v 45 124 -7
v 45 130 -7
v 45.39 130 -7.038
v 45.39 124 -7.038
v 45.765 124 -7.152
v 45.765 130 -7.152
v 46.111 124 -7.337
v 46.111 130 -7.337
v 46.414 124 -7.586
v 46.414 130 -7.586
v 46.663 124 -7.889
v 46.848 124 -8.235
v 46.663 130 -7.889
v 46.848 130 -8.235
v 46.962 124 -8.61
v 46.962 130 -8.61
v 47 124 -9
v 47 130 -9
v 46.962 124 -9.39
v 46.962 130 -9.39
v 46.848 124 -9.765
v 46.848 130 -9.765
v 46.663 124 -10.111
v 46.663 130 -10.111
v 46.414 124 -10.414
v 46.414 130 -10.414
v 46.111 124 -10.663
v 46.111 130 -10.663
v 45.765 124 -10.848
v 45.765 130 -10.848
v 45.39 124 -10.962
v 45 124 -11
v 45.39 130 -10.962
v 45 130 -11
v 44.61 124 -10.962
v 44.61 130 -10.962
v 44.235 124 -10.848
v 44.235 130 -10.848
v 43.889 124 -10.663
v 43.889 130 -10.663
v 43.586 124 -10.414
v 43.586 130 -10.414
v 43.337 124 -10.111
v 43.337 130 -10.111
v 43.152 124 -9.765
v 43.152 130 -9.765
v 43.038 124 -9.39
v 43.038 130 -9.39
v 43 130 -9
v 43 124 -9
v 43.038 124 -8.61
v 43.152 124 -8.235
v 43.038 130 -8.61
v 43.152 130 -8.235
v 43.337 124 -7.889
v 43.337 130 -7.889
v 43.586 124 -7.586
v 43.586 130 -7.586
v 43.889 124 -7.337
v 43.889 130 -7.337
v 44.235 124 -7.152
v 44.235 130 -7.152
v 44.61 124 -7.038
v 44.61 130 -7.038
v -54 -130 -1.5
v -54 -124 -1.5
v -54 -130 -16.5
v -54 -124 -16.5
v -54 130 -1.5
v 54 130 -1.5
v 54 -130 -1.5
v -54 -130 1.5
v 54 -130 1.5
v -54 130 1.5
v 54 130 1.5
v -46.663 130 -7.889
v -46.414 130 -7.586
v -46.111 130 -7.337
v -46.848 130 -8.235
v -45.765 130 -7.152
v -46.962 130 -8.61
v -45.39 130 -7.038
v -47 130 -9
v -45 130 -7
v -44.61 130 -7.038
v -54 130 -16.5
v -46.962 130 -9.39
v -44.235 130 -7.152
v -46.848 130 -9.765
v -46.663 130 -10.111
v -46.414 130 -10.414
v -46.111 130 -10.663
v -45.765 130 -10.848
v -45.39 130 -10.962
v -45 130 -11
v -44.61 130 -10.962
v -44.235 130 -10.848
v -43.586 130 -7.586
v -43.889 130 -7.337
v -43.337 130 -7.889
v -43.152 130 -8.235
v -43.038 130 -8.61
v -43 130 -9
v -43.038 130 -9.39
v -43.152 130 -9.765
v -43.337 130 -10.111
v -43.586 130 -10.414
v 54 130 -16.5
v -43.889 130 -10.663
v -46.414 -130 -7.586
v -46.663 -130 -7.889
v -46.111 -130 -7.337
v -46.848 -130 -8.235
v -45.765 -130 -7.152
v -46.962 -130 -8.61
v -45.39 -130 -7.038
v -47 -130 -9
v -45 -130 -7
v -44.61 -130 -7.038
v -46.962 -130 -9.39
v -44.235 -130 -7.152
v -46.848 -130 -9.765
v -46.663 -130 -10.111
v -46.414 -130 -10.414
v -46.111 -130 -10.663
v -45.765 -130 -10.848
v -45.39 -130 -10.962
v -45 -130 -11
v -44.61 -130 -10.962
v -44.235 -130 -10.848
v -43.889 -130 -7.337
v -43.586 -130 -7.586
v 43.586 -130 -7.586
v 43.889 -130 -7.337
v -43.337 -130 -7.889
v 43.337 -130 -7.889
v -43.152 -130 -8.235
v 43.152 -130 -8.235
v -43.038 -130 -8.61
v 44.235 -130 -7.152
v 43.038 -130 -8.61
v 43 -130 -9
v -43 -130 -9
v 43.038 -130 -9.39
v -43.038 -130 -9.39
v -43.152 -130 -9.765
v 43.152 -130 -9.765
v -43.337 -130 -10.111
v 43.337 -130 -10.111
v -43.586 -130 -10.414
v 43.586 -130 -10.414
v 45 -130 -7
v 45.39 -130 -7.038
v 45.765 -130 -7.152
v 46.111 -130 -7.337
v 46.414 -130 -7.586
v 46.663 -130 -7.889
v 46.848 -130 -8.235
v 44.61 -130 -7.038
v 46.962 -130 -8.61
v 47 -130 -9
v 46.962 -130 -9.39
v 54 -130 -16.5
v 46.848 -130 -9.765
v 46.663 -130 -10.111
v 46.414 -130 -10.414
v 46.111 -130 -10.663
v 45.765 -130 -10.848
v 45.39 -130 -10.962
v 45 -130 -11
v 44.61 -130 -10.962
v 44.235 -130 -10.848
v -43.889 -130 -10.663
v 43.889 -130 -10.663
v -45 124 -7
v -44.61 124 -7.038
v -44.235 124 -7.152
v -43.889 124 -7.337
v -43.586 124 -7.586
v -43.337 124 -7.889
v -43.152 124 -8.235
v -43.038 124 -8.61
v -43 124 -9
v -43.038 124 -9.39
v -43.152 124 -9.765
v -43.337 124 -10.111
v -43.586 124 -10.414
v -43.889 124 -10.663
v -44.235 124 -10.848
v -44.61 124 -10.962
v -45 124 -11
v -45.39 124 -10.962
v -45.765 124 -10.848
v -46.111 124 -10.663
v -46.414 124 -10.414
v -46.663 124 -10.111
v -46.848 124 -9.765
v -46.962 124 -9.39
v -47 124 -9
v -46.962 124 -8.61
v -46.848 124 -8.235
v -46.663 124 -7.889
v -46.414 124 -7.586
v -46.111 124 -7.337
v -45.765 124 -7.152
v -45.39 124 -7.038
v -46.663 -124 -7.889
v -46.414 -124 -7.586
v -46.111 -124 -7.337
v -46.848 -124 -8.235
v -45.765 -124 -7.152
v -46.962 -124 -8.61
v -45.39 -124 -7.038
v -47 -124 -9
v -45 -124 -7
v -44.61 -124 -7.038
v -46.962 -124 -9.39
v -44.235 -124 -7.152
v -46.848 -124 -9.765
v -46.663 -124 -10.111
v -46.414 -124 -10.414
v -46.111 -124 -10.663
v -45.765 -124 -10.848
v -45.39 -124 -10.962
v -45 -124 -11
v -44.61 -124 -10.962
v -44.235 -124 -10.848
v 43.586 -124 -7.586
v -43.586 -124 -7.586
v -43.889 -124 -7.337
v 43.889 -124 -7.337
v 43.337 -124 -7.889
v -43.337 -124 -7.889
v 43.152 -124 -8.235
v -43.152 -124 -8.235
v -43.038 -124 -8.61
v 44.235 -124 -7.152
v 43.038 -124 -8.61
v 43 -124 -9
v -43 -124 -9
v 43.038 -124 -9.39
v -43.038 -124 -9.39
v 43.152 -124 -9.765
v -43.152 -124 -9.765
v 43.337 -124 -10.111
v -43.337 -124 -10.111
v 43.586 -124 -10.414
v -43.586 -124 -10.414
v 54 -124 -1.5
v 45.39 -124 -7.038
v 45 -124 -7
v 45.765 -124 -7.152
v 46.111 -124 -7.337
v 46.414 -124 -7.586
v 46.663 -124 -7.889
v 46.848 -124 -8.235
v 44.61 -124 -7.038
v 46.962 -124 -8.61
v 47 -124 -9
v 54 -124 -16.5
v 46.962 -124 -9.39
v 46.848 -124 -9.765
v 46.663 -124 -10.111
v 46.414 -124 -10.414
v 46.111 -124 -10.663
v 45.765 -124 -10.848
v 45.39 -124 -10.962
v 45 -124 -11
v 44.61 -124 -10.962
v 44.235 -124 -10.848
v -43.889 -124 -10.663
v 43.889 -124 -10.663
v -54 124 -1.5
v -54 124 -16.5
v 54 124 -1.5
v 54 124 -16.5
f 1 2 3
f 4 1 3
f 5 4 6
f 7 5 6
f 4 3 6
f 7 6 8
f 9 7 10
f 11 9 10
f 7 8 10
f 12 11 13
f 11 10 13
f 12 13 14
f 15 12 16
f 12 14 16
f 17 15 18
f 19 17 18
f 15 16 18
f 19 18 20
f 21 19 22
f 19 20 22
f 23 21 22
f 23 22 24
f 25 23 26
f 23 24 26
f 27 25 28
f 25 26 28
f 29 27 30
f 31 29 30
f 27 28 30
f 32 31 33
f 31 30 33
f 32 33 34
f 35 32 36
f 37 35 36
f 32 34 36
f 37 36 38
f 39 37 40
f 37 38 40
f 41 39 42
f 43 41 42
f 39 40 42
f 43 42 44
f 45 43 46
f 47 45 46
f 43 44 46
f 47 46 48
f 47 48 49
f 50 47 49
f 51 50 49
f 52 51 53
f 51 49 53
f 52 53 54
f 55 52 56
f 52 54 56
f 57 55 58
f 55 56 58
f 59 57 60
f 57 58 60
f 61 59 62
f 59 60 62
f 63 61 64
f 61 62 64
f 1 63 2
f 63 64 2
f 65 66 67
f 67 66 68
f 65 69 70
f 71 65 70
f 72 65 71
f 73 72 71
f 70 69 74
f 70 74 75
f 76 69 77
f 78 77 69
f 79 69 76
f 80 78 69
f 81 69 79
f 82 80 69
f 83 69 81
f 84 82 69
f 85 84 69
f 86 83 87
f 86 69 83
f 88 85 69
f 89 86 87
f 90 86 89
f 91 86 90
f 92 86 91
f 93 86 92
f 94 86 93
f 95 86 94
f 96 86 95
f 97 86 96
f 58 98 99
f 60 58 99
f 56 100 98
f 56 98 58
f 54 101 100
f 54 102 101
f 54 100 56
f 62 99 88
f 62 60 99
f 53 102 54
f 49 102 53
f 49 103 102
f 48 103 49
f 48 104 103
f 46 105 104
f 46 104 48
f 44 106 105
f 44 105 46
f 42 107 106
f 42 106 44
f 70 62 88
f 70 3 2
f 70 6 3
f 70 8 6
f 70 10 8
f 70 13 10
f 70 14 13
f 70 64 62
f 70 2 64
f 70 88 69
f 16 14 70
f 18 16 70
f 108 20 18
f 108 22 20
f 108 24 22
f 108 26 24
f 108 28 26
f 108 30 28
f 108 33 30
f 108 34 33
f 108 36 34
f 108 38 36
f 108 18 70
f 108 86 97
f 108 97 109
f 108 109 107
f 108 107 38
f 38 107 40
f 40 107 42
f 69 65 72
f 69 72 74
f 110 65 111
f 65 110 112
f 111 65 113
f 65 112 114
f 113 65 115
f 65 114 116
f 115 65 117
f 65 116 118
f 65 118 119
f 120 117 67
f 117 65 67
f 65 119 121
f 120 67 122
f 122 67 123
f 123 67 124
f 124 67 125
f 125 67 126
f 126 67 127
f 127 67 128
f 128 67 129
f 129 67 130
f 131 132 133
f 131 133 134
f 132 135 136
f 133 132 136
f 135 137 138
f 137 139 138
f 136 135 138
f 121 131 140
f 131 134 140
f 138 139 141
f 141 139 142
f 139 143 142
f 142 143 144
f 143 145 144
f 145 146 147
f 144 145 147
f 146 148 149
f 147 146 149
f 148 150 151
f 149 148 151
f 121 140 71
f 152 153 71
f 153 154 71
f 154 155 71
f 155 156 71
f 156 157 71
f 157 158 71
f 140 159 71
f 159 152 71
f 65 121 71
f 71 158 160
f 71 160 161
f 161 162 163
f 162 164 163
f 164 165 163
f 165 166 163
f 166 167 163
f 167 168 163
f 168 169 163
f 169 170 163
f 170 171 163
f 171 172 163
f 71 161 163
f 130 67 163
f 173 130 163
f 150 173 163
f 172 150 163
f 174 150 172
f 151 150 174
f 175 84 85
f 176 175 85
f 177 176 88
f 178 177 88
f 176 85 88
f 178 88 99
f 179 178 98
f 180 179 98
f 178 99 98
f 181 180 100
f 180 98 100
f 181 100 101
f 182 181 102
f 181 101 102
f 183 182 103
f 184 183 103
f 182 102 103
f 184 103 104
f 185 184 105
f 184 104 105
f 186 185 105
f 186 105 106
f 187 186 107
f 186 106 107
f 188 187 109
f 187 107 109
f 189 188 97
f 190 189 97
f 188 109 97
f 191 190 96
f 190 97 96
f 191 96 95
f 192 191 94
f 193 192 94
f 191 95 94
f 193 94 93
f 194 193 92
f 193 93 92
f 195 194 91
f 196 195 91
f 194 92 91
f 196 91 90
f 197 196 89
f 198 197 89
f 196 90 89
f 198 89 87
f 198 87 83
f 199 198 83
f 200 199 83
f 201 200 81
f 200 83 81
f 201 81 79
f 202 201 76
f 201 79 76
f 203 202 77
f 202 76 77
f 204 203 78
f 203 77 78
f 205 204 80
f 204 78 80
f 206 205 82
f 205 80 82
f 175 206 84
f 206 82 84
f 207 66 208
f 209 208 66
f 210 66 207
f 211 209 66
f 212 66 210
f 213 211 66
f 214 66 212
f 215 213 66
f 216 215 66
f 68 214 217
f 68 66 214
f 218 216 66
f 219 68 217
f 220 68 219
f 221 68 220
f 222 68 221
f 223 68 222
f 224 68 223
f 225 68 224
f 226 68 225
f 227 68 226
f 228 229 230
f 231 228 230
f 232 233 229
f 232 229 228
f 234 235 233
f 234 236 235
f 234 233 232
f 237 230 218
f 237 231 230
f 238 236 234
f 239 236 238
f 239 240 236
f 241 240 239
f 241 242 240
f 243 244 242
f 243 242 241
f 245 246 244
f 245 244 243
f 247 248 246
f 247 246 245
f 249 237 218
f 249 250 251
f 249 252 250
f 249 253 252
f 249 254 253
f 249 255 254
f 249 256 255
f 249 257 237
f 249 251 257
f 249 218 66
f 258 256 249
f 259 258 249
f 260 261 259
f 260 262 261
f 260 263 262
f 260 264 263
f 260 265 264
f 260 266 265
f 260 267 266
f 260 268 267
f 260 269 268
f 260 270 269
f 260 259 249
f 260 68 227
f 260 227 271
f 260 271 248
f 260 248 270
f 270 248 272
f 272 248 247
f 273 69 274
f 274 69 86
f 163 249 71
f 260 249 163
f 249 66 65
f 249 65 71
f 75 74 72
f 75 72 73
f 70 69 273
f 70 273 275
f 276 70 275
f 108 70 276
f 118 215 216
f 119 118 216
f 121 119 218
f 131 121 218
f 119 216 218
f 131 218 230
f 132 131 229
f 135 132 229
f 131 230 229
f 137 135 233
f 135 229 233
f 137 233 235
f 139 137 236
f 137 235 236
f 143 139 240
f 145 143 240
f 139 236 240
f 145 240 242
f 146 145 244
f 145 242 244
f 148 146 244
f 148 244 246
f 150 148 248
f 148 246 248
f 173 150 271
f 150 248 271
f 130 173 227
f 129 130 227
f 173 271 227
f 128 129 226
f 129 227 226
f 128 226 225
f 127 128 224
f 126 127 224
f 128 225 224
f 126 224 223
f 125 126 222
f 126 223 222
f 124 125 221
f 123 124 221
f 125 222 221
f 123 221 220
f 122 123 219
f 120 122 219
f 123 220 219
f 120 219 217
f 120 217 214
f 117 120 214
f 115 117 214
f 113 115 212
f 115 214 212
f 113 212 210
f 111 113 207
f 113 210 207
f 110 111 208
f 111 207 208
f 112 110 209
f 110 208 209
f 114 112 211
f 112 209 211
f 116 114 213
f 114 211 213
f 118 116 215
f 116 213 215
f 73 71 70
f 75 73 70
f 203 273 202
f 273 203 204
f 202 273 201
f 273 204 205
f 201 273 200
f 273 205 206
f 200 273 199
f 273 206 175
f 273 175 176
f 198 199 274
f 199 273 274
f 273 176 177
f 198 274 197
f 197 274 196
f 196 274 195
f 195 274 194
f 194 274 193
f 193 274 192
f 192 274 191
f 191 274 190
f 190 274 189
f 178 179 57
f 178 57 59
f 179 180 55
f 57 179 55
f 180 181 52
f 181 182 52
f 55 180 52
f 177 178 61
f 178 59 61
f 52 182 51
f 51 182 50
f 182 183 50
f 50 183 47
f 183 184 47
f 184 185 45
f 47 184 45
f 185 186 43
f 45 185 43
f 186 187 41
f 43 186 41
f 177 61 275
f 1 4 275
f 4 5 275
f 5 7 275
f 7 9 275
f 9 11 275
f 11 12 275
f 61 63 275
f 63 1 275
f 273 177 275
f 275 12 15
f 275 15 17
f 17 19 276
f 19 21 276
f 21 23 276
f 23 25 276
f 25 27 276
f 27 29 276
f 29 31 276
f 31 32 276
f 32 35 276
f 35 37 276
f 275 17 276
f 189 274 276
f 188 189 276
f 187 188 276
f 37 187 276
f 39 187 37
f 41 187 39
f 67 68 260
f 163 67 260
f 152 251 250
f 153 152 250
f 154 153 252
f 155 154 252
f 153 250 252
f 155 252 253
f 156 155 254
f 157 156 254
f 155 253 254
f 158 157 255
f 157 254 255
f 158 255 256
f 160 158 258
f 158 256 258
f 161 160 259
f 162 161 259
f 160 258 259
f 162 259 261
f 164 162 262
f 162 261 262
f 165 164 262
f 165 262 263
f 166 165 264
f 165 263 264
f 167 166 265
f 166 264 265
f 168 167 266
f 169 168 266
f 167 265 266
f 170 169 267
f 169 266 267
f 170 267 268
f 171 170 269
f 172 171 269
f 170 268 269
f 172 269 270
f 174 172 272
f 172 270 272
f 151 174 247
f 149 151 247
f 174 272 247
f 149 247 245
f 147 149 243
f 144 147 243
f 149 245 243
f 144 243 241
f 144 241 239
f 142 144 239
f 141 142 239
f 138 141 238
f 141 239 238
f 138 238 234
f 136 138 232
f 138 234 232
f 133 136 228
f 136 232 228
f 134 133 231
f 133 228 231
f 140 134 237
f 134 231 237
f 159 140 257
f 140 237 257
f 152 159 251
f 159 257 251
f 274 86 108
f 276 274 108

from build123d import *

# Parameters (mm, degrees)
BOSS_EXTRUDE1_DEPTH      = 1.5
BOSS_EXTRUDE1_DEPTH_BACK = 1.5
SKETCH1_W                = 108
SKETCH1_H                = 260
SKETCH2_W                = 108
SKETCH2_H                = 15
SKETCH2_R                = 2
BOSS_EXTRUDE2_DEPTH      = 6
LPATTERN1_COUNT          = 2
LPATTERN1_PITCH          = 254


with BuildPart() as part:
    # Sketch1 → Boss-Extrude1 (new, two sides: drawn at the far end of the back side and taken through both)
    with BuildSketch(Plane.XY.offset(-BOSS_EXTRUDE1_DEPTH_BACK)):
        Rectangle(SKETCH1_W, SKETCH1_H)
    extrude(amount=BOSS_EXTRUDE1_DEPTH + BOSS_EXTRUDE1_DEPTH_BACK)


with BuildPart() as body_2:
    # Sketch2 → Boss-Extrude2 (new body)
    with BuildSketch(Plane(origin=(0, 130, 0), x_dir=(1, 0, 0), z_dir=(0, 1, 0))):
        with Locations((0, 9)):
            Rectangle(SKETCH2_W, SKETCH2_H)
        with Locations((45, 9)):
            Circle(SKETCH2_R, mode=Mode.SUBTRACT)
        with Locations((-45, 9)):
            Circle(SKETCH2_R, mode=Mode.SUBTRACT)
    boss_extrude2 = extrude(amount=-BOSS_EXTRUDE2_DEPTH)


with BuildPart() as lpattern1_1:
    # LPattern1: Boss-Extrude2 ×2
    with Locations(*[(0, -i * LPATTERN1_PITCH, 0) for i in range(1, LPATTERN1_COUNT)]):
        add(boss_extrude2)


solid = Compound([part.part, body_2.part, lpattern1_1.part])
